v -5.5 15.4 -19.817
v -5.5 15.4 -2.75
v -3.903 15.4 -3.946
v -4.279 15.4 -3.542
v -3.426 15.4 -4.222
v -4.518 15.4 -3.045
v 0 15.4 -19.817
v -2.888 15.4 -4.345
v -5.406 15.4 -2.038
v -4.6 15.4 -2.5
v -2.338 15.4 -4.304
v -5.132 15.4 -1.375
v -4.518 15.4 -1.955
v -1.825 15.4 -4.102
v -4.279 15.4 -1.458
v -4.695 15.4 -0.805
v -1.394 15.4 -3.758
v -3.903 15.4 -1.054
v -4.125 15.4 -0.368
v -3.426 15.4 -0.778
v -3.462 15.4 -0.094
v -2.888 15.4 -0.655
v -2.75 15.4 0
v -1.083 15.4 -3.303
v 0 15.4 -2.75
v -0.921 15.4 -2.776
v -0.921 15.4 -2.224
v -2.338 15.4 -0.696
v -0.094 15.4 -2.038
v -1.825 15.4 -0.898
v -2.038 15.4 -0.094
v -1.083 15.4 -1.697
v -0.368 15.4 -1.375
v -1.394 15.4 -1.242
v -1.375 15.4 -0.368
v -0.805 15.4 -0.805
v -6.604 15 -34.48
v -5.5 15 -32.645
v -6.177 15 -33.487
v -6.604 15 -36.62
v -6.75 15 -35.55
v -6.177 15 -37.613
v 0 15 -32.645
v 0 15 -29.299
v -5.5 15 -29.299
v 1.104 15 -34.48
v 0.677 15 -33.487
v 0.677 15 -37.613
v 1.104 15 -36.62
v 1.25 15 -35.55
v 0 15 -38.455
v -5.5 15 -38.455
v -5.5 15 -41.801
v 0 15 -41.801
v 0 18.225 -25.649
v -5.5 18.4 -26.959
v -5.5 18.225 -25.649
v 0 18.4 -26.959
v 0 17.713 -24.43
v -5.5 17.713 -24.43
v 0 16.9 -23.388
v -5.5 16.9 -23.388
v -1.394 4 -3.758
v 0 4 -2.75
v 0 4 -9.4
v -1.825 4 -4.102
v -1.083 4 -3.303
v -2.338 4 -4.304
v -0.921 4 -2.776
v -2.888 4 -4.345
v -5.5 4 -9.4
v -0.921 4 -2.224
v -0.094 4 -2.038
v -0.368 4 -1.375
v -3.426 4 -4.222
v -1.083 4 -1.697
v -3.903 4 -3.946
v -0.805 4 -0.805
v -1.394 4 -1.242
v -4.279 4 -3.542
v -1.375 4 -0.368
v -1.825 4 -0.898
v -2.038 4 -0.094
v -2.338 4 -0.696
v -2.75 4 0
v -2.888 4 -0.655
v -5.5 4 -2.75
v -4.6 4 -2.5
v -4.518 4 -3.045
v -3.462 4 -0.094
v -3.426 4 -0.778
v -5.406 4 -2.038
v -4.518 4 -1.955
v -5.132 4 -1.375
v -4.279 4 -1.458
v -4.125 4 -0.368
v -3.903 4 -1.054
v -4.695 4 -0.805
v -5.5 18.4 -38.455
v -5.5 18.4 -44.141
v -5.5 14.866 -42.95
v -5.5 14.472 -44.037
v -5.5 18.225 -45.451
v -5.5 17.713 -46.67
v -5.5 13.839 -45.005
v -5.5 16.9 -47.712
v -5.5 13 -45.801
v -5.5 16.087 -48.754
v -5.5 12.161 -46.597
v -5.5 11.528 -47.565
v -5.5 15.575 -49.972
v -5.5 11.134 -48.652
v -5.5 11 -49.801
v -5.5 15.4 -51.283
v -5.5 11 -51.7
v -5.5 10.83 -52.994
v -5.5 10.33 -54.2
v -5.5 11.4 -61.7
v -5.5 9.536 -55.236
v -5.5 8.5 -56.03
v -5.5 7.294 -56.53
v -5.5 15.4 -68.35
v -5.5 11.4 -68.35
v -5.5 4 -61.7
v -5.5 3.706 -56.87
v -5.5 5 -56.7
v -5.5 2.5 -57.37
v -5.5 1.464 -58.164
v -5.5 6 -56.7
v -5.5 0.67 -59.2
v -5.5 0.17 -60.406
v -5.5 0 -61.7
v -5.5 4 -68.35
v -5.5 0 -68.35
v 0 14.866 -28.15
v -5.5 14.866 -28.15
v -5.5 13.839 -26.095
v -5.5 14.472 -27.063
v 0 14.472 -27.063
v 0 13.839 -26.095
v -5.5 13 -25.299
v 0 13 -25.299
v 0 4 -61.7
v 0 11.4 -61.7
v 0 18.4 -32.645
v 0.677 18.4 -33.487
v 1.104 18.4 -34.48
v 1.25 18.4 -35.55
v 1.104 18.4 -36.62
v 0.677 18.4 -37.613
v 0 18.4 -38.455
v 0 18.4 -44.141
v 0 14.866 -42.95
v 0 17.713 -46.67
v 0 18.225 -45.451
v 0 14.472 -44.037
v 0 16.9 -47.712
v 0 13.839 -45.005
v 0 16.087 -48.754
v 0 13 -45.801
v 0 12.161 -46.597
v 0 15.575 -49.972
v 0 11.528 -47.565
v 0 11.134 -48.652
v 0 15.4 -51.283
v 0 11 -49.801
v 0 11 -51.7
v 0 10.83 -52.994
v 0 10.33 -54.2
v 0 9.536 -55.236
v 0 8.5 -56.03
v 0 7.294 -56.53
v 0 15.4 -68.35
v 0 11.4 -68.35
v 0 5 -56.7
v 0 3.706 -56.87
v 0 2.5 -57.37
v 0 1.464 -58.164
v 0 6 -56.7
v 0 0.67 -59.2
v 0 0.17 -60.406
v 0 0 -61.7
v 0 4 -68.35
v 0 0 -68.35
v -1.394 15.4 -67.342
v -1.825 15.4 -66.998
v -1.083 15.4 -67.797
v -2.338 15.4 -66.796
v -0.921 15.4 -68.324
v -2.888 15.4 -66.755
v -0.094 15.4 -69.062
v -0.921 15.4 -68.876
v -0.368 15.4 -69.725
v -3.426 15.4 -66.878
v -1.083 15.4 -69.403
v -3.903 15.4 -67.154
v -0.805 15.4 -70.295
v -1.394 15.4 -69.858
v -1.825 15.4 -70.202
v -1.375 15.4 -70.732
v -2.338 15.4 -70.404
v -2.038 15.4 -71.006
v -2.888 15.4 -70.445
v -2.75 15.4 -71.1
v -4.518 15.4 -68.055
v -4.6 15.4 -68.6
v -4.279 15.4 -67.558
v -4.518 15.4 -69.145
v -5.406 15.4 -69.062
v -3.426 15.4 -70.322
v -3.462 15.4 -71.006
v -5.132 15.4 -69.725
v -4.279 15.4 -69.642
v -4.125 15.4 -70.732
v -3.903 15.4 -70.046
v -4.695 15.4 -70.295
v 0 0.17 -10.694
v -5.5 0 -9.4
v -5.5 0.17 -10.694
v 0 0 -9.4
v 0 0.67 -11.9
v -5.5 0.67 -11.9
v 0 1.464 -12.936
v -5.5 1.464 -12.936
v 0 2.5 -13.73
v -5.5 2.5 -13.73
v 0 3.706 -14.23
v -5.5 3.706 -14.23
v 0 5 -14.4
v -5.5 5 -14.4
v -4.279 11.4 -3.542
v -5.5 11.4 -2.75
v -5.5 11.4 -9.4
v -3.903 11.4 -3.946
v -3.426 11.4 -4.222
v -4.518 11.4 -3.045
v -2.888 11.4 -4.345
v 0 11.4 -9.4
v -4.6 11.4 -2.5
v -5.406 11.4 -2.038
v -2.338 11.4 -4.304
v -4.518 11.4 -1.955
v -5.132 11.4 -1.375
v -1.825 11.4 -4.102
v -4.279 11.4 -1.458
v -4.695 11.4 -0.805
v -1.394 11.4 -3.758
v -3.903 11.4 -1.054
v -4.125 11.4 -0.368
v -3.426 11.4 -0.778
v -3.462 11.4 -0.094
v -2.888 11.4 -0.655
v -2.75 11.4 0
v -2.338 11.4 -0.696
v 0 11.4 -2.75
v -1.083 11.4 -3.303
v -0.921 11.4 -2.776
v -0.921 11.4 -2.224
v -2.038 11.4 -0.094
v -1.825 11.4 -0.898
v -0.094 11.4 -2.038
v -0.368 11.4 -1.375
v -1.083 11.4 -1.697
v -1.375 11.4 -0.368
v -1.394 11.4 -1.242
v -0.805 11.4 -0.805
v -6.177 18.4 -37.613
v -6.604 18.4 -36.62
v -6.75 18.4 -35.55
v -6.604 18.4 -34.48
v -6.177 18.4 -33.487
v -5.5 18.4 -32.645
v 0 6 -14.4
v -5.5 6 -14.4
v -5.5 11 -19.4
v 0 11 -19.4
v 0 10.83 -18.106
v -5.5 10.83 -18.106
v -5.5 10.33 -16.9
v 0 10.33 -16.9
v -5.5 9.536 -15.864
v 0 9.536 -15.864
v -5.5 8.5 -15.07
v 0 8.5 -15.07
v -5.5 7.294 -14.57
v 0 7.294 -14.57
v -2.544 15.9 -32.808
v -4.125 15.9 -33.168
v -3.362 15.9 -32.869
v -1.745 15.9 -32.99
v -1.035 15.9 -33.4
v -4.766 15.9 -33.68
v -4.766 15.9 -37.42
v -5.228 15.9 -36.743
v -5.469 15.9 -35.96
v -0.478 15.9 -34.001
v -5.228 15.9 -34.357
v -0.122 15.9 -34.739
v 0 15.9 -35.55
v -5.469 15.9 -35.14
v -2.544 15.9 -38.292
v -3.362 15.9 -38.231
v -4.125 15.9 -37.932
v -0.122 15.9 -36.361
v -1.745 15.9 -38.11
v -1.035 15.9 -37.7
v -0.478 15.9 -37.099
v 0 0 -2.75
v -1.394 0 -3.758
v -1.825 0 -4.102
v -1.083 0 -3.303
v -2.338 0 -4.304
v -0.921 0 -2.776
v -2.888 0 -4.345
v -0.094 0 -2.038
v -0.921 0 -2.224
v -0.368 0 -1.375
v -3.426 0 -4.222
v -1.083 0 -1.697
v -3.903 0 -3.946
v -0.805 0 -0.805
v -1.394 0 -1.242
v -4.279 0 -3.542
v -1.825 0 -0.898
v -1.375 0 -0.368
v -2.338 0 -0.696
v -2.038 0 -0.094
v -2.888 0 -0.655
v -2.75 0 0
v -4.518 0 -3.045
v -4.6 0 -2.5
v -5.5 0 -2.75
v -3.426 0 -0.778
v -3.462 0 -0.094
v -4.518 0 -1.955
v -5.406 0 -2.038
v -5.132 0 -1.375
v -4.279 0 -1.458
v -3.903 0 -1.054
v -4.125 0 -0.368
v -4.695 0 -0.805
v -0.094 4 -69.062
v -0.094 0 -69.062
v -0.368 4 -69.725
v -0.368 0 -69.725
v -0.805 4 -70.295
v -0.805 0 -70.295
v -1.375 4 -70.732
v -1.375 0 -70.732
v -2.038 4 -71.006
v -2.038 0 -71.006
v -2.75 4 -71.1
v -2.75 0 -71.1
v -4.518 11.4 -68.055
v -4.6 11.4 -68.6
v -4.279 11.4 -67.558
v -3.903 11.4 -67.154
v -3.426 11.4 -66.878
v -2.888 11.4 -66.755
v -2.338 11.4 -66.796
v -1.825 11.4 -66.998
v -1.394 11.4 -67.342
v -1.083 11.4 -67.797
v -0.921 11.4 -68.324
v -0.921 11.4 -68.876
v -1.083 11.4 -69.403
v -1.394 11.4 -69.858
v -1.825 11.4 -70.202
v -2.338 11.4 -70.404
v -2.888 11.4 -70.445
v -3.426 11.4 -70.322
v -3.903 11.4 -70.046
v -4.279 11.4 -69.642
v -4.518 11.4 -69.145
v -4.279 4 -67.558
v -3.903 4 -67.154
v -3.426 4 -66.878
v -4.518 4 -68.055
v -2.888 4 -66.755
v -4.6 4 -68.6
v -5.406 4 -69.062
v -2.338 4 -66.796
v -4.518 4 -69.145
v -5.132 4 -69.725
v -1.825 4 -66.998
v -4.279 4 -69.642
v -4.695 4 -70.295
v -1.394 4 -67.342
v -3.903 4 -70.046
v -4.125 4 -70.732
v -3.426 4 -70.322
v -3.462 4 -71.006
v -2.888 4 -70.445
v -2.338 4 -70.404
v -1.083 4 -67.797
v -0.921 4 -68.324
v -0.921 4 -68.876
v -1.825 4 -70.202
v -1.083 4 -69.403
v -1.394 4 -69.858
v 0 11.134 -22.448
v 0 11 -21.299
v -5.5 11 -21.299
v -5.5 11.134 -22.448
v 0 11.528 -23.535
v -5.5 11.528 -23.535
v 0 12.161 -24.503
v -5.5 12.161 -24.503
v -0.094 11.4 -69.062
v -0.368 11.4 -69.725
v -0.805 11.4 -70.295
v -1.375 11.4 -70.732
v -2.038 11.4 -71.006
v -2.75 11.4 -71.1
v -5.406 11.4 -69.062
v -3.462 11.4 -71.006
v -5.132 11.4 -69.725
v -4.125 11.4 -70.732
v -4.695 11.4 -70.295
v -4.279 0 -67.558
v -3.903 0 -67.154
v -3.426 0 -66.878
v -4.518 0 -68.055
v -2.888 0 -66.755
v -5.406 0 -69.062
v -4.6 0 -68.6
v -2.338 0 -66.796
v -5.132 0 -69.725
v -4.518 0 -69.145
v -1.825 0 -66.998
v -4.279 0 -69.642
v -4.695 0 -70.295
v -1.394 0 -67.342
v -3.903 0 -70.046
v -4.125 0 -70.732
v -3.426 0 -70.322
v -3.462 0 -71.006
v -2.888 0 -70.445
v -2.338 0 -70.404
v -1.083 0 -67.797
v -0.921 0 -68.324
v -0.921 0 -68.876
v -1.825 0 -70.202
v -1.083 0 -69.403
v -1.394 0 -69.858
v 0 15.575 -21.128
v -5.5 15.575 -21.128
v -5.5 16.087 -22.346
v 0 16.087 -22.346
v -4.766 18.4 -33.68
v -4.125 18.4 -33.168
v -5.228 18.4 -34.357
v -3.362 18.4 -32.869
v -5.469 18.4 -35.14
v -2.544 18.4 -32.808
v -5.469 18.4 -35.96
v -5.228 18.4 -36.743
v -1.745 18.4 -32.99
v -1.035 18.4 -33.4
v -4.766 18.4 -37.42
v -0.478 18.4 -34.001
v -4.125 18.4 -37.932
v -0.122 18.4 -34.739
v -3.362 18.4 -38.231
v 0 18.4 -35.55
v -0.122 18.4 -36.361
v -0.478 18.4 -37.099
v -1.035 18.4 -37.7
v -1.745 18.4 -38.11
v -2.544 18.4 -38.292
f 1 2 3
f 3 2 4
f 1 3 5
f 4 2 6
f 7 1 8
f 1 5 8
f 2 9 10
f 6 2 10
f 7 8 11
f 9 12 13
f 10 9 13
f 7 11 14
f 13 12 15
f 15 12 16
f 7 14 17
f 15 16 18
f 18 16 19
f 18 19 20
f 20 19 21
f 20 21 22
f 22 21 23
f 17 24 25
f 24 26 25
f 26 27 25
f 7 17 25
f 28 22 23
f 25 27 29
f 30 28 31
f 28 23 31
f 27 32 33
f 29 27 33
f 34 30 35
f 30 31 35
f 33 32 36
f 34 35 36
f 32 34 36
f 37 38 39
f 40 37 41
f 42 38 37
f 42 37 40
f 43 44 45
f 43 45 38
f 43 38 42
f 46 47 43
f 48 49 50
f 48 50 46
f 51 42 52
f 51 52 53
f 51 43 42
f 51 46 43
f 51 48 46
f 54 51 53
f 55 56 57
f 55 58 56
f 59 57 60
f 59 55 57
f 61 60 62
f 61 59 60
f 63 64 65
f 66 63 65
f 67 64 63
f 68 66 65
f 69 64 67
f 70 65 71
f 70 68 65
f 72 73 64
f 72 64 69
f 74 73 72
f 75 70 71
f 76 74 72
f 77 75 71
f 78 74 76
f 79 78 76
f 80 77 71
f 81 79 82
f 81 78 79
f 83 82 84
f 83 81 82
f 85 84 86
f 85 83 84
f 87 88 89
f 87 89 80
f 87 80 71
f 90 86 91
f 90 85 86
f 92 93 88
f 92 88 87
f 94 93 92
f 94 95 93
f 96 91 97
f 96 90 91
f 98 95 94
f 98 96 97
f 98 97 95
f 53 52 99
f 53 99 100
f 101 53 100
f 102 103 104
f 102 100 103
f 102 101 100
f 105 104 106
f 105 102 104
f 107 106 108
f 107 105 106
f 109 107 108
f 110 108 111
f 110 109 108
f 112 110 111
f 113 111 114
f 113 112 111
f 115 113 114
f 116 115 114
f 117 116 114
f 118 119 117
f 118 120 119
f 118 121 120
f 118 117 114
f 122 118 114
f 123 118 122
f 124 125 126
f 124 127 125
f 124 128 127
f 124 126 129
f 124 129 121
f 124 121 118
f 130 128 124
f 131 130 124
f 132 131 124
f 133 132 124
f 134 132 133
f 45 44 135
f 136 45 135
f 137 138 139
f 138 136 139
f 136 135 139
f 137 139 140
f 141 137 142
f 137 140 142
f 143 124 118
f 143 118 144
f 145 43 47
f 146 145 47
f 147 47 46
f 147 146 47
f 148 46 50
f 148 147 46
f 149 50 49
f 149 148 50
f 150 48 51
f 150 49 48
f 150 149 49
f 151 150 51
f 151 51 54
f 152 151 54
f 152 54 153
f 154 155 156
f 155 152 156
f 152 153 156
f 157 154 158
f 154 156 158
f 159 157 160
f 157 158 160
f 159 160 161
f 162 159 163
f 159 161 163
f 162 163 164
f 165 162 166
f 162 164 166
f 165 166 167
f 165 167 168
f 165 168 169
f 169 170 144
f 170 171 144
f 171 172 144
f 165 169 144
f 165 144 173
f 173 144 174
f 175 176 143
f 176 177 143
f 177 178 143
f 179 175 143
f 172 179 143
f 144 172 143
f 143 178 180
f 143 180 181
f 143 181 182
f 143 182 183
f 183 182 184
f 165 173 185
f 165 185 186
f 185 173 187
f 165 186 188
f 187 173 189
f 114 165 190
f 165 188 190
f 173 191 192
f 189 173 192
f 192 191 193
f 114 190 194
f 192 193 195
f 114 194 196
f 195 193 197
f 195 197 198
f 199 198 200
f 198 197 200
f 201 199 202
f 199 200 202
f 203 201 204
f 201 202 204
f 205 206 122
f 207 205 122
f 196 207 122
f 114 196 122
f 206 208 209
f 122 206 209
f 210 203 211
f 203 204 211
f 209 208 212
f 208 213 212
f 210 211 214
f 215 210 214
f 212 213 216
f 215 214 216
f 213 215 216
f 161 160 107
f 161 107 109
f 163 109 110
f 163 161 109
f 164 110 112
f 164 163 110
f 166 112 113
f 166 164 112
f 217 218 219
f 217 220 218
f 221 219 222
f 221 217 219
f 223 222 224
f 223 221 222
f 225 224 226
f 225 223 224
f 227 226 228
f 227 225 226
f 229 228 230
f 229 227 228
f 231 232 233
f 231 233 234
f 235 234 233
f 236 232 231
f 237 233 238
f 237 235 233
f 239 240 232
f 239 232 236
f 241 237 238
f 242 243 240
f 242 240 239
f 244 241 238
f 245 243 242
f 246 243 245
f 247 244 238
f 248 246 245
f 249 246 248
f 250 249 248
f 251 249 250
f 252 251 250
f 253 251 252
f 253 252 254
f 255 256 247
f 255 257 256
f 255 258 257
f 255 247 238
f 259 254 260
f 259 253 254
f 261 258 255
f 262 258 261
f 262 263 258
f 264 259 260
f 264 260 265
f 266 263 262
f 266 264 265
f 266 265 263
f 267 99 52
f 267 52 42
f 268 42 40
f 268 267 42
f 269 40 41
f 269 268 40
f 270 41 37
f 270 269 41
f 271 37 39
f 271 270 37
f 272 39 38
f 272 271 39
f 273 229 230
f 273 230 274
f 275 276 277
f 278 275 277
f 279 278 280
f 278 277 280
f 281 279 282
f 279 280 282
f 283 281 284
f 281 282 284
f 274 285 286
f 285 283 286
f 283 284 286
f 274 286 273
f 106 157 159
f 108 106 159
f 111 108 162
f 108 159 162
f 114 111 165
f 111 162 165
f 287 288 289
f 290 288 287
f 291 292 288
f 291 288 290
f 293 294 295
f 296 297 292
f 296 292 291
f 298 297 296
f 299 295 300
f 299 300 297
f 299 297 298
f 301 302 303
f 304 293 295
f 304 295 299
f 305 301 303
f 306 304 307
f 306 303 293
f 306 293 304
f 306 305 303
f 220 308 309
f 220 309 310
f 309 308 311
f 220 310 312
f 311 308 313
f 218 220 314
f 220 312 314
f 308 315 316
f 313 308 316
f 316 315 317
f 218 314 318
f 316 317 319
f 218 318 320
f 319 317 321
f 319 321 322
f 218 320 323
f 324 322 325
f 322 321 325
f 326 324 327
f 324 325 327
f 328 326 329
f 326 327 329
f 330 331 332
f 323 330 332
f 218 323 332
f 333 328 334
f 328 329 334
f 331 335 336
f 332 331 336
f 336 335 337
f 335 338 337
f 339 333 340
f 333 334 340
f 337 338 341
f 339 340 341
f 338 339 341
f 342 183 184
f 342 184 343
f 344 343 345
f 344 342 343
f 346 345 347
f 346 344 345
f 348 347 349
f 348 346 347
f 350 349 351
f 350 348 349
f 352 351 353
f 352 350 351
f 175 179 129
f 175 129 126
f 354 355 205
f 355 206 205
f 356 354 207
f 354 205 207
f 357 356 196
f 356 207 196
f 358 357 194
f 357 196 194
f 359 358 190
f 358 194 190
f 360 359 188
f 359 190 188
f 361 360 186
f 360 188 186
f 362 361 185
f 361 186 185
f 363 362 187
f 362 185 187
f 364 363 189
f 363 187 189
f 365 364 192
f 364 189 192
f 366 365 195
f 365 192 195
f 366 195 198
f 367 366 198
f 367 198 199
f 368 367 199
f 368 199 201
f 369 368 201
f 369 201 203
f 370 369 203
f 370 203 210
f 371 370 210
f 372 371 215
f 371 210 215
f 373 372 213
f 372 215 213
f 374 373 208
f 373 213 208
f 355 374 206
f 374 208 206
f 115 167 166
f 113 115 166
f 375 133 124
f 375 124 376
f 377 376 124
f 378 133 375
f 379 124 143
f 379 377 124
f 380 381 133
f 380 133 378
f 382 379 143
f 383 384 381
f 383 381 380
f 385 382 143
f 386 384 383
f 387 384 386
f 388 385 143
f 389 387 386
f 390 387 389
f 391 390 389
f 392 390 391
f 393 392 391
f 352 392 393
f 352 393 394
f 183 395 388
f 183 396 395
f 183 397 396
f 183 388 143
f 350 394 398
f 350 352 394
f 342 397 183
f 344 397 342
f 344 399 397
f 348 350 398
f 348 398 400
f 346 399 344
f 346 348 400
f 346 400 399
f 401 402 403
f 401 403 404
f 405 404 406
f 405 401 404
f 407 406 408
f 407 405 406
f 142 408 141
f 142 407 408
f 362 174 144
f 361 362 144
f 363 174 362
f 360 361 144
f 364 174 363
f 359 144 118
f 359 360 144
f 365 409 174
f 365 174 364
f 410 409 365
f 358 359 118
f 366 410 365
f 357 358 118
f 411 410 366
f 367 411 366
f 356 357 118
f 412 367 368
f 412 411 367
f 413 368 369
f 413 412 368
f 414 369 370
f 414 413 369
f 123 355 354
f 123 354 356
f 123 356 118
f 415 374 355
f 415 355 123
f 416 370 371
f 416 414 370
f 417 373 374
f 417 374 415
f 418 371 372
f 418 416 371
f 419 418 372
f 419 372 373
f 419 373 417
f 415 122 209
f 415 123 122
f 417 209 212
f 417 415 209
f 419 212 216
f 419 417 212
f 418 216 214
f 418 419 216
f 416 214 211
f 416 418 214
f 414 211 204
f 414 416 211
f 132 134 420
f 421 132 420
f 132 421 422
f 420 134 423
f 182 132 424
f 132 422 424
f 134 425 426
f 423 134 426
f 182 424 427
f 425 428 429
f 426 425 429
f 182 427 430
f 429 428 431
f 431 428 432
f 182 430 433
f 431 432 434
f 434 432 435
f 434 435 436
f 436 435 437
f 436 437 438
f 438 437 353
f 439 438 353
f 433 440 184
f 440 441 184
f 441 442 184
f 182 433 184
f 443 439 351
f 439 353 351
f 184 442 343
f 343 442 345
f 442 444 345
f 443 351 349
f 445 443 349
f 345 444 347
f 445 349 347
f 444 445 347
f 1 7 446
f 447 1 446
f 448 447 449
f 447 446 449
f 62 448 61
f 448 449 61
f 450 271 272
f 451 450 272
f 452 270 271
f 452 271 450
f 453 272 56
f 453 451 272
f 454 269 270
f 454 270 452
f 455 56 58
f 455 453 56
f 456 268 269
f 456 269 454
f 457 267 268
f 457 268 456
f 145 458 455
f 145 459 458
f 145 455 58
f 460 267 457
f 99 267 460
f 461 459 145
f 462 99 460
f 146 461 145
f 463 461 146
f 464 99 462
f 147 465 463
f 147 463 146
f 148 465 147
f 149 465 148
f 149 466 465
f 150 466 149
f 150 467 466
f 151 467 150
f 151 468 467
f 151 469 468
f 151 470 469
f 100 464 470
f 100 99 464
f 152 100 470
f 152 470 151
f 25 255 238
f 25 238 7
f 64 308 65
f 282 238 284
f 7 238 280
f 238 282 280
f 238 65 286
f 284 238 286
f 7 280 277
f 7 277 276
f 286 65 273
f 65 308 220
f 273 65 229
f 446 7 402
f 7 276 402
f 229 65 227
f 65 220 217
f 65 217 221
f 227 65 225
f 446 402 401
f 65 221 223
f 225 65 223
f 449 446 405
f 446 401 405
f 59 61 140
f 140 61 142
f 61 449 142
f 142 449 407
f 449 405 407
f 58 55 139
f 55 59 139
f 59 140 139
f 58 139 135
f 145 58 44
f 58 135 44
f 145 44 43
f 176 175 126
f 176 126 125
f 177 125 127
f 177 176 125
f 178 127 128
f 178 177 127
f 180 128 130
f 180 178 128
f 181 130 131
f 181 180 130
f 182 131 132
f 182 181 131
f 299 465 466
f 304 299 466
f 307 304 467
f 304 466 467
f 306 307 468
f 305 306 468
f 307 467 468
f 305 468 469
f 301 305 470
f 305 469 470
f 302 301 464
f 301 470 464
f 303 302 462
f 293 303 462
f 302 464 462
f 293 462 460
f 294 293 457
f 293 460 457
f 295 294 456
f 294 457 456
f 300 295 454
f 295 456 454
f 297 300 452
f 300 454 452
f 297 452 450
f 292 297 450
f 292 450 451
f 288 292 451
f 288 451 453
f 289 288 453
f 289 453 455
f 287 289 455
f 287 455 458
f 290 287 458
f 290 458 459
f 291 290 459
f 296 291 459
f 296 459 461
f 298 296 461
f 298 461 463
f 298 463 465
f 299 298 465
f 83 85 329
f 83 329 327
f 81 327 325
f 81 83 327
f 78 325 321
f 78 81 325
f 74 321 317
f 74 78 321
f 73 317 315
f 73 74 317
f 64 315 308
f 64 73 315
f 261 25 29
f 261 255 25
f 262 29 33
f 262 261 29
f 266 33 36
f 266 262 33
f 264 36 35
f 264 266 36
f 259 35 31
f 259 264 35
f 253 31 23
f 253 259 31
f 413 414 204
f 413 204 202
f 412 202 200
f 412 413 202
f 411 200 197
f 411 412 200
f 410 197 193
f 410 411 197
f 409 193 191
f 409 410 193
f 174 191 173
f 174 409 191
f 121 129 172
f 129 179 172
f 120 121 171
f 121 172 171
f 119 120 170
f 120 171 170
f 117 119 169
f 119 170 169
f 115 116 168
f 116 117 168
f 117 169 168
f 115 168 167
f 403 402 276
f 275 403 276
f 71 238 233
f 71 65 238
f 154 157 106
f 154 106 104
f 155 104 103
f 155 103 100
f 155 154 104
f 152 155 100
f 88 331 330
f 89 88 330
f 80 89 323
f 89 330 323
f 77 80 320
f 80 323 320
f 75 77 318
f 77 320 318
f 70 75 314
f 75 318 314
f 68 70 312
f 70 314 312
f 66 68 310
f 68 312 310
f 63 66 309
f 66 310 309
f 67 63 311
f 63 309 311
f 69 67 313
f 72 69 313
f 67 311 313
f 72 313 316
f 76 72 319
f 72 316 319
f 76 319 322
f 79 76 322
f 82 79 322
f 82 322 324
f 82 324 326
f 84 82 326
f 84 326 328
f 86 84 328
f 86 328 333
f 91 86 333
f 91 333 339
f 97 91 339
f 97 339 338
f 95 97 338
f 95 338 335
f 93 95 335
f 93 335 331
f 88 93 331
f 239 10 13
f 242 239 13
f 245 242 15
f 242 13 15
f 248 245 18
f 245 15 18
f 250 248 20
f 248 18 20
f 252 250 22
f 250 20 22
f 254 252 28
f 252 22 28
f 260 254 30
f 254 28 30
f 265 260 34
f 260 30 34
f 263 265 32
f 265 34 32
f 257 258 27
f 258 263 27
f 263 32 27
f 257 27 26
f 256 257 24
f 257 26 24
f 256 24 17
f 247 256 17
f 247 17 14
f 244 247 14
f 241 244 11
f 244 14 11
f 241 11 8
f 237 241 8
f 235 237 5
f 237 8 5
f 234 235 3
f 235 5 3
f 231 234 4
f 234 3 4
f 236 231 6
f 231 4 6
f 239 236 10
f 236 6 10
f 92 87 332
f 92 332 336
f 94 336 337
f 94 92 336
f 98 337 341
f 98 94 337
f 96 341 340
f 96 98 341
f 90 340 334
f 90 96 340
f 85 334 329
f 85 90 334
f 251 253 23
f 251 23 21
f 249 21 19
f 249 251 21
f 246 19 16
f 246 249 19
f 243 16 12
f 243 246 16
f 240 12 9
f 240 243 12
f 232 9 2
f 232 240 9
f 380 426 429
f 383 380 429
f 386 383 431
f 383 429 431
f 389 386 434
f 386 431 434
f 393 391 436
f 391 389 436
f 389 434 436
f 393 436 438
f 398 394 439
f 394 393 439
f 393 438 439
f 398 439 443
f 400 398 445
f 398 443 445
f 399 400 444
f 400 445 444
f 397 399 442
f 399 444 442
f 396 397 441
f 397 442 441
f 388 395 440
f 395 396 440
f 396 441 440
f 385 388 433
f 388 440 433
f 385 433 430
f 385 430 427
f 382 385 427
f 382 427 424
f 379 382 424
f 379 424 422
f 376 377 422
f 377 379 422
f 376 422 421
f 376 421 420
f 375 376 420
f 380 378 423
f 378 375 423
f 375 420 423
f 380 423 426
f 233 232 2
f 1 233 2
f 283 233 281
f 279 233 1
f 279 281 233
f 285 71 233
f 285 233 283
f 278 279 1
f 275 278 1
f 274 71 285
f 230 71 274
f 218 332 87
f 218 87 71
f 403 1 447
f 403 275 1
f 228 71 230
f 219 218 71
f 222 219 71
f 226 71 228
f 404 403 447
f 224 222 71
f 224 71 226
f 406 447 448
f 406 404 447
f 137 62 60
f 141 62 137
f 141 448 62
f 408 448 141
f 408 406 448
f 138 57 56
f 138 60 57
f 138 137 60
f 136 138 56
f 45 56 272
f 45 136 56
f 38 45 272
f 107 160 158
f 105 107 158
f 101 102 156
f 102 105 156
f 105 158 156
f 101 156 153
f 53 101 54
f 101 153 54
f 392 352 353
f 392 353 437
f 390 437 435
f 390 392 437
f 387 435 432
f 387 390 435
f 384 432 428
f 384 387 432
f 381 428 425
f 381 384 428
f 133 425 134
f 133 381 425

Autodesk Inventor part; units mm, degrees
ref_plane "YZ Plane" through (0, 0, 0) normal (1, 0, 0) x (0, 1, 0)
ref_plane "XZ Plane" through (0, 0, 0) normal (0, 1, 0) x (-1, 0, 0)
ref_plane "XY Plane" through (0, 0, 0) normal (0, 0, 1) x (1, 0, 0)
sketch "Эскиз1" plane through (0, 0, 0) normal (0, 1, 0) x (-1, 0, 0)
  line L0 (0, 0) -> (5.5, 0)
  line L1 (5.5, 0) -> (5.5, -35.55)
  line L2 (5.5, -35.55) -> (0, -35.55)
  line L3 (0, -35.55) -> (0, 0)
  line L4 (2.75, 0) -> (2.75, -2.5)
  circle A0 centre (2.75, -2.5) radius 1.85
  dimension "d0" = 5.5
  dimension "d1" = 35.55
  dimension "d4" = 2.5
  dimension "d5" = 3.7
extrude "Выдавливание1" add sketch "Эскиз1" along normal blind 4
fillet "Сопряжение1" radius 2.75 2 edges at (0, 2, 0) (-5.5, 2, 0)
sketch "Эскиз2" plane through (0, 4, 0) normal (0, 1, 0) x (1, 0, 0)
  line L0 (0, 2.75) -> (0, 35.55) projected
  line L1 (-5.5, 35.55) -> (0, 35.55)
  line L2 (0, 35.55) -> (0, 9.4)
  line L3 (0, 9.4) -> (-5.5, 9.4)
  line L4 (-5.5, 9.4) -> (-5.5, 35.55)
  point P0 (0, 0)
  point P1 (0, 35.55)
  dimension "d7" = 26.15
  dimension "d45" = 32.8
extrude "Выдавливание2" add sketch "Эскиз2" along normal blind 3.7
mirror "Зеркальное отражение3" about plane through (-2.75, 7.7, -22.475) normal (0, 1, 0)
sketch "Эскиз8" plane through (0, 0, -2.75) normal (1, 0, 0) x (0, 0, -1)
  line L0 (0, 0) -> (32.8, 0) projected
  line L1 (32.8, 0) -> (11.65, 0)
  line L2 (11.65, 0) -> (11.65, 15)
  line L3 (11.65, 15) -> (32.8, 15)
  line L4 (32.8, 15) -> (32.8, 0)
  line L5 (6.65, 4) -> (6.65, 11.4) projected
  line L6 (11.65, 15) -> (21.65, 15)
  line L7 (21.65, 15) -> (21.65, 11)
  line L8 (21.65, 11) -> (11.65, 11)
  line L9 (11.65, 11) -> (11.65, 15)
  point P0 (-2.75, 0)
  dimension "d35" = 21.15
  dimension "d36" = 15
  dimension "d52" = 26.15
  dimension "d60" = 10
  dimension "d61" = 4
extrude "Выдавливание6" cut sketch "Эскиз8" against normal through all contours L2 L8 L7 L3 L4 L0
sketch "Эскиз13" plane through (-5.5, 15.4, -35.55) normal (0, 1, 0) x (1, 0, 0)
  line L0 (0, 0) -> (0, -11.15) projected
  line L1 (5.5, 0) -> (0, 0) projected
  line L2 (5.5, -11.15) -> (5.5, 0) projected
  line L3 (5.5, -11.15) -> (0, -11.15) projected
  point P0 (5.5, -35.55)
extrude "Выдавливание11" add sketch "Эскиз13" along normal blind 3
mirror "Зеркальное отражение6" about plane through (0, 0, -35.55) normal (0, 0, -1)
fillet "Сопряжение5" radius 5 12 edges at (-2.75, 0, -14.4) (-2.75, 0, -56.7) (-2.75, 11, -14.4) (-2.75, 11, -24.4) (-2.75, 15, -24.4) (-2.75, 11, -56.7) (-2.75, 11, -46.7) (-2.75, 15, -46.7) (-2.75, 18.4, -24.4) (-2.75, 18.4, -46.7) (-2.75, 15.4, -24.4) (-2.75, 15.4, -46.7)
sketch "Эскиз9" plane through (-2.75, 18.4, 16.75) normal (0, 1, 0) x (1, 0, 0)
  circle A0 centre (0, 52.3) radius 4
  line L0 (-2.75, 58.551) -> (-2.75, 46.049) projected
  line L1 (-2.75, 52.3) -> (2.75, 52.3)
  line L2 (2.75, 58.551) -> (2.75, 46.049) projected
  point P0 (2.75, 104.6)
  point P1 (-2.75, 104.6)
  point P2 (60.3162, 64.5588)
  point P3 (0, 52.3)
  dimension "d46" = 8
extrude "Выдавливание7" add sketch "Эскиз9" against normal up to surface (3.4 mm away)
sketch "Эскиз10" plane through (-2.75, 18.4, 16.75) normal (0, 1, 0) x (1, 0, 0)
  arc A0 (-2.75, 55.2047) -> (-2.75, 49.3953) centre (0, 52.3) ccw projected
  arc A1 (-2.75, 55.2047) -> (-2.75, 49.3953) centre (0, 52.3) ccw projected
  circle A2 centre (0, 52.3) radius 2.75
  point P0 (2.75, 16.75)
  point P1 (-2.75, 23.7297)
  point P2 (-2.75, 17.9203)
  point P3 (2.75, 17.9203)
  point P4 (2.75, 23.7297)
  dimension "d49" = 5.5
extrude "Выдавливание8" cut sketch "Эскиз10" against normal blind 2.5
properties part number "Балка рулевого управления"
